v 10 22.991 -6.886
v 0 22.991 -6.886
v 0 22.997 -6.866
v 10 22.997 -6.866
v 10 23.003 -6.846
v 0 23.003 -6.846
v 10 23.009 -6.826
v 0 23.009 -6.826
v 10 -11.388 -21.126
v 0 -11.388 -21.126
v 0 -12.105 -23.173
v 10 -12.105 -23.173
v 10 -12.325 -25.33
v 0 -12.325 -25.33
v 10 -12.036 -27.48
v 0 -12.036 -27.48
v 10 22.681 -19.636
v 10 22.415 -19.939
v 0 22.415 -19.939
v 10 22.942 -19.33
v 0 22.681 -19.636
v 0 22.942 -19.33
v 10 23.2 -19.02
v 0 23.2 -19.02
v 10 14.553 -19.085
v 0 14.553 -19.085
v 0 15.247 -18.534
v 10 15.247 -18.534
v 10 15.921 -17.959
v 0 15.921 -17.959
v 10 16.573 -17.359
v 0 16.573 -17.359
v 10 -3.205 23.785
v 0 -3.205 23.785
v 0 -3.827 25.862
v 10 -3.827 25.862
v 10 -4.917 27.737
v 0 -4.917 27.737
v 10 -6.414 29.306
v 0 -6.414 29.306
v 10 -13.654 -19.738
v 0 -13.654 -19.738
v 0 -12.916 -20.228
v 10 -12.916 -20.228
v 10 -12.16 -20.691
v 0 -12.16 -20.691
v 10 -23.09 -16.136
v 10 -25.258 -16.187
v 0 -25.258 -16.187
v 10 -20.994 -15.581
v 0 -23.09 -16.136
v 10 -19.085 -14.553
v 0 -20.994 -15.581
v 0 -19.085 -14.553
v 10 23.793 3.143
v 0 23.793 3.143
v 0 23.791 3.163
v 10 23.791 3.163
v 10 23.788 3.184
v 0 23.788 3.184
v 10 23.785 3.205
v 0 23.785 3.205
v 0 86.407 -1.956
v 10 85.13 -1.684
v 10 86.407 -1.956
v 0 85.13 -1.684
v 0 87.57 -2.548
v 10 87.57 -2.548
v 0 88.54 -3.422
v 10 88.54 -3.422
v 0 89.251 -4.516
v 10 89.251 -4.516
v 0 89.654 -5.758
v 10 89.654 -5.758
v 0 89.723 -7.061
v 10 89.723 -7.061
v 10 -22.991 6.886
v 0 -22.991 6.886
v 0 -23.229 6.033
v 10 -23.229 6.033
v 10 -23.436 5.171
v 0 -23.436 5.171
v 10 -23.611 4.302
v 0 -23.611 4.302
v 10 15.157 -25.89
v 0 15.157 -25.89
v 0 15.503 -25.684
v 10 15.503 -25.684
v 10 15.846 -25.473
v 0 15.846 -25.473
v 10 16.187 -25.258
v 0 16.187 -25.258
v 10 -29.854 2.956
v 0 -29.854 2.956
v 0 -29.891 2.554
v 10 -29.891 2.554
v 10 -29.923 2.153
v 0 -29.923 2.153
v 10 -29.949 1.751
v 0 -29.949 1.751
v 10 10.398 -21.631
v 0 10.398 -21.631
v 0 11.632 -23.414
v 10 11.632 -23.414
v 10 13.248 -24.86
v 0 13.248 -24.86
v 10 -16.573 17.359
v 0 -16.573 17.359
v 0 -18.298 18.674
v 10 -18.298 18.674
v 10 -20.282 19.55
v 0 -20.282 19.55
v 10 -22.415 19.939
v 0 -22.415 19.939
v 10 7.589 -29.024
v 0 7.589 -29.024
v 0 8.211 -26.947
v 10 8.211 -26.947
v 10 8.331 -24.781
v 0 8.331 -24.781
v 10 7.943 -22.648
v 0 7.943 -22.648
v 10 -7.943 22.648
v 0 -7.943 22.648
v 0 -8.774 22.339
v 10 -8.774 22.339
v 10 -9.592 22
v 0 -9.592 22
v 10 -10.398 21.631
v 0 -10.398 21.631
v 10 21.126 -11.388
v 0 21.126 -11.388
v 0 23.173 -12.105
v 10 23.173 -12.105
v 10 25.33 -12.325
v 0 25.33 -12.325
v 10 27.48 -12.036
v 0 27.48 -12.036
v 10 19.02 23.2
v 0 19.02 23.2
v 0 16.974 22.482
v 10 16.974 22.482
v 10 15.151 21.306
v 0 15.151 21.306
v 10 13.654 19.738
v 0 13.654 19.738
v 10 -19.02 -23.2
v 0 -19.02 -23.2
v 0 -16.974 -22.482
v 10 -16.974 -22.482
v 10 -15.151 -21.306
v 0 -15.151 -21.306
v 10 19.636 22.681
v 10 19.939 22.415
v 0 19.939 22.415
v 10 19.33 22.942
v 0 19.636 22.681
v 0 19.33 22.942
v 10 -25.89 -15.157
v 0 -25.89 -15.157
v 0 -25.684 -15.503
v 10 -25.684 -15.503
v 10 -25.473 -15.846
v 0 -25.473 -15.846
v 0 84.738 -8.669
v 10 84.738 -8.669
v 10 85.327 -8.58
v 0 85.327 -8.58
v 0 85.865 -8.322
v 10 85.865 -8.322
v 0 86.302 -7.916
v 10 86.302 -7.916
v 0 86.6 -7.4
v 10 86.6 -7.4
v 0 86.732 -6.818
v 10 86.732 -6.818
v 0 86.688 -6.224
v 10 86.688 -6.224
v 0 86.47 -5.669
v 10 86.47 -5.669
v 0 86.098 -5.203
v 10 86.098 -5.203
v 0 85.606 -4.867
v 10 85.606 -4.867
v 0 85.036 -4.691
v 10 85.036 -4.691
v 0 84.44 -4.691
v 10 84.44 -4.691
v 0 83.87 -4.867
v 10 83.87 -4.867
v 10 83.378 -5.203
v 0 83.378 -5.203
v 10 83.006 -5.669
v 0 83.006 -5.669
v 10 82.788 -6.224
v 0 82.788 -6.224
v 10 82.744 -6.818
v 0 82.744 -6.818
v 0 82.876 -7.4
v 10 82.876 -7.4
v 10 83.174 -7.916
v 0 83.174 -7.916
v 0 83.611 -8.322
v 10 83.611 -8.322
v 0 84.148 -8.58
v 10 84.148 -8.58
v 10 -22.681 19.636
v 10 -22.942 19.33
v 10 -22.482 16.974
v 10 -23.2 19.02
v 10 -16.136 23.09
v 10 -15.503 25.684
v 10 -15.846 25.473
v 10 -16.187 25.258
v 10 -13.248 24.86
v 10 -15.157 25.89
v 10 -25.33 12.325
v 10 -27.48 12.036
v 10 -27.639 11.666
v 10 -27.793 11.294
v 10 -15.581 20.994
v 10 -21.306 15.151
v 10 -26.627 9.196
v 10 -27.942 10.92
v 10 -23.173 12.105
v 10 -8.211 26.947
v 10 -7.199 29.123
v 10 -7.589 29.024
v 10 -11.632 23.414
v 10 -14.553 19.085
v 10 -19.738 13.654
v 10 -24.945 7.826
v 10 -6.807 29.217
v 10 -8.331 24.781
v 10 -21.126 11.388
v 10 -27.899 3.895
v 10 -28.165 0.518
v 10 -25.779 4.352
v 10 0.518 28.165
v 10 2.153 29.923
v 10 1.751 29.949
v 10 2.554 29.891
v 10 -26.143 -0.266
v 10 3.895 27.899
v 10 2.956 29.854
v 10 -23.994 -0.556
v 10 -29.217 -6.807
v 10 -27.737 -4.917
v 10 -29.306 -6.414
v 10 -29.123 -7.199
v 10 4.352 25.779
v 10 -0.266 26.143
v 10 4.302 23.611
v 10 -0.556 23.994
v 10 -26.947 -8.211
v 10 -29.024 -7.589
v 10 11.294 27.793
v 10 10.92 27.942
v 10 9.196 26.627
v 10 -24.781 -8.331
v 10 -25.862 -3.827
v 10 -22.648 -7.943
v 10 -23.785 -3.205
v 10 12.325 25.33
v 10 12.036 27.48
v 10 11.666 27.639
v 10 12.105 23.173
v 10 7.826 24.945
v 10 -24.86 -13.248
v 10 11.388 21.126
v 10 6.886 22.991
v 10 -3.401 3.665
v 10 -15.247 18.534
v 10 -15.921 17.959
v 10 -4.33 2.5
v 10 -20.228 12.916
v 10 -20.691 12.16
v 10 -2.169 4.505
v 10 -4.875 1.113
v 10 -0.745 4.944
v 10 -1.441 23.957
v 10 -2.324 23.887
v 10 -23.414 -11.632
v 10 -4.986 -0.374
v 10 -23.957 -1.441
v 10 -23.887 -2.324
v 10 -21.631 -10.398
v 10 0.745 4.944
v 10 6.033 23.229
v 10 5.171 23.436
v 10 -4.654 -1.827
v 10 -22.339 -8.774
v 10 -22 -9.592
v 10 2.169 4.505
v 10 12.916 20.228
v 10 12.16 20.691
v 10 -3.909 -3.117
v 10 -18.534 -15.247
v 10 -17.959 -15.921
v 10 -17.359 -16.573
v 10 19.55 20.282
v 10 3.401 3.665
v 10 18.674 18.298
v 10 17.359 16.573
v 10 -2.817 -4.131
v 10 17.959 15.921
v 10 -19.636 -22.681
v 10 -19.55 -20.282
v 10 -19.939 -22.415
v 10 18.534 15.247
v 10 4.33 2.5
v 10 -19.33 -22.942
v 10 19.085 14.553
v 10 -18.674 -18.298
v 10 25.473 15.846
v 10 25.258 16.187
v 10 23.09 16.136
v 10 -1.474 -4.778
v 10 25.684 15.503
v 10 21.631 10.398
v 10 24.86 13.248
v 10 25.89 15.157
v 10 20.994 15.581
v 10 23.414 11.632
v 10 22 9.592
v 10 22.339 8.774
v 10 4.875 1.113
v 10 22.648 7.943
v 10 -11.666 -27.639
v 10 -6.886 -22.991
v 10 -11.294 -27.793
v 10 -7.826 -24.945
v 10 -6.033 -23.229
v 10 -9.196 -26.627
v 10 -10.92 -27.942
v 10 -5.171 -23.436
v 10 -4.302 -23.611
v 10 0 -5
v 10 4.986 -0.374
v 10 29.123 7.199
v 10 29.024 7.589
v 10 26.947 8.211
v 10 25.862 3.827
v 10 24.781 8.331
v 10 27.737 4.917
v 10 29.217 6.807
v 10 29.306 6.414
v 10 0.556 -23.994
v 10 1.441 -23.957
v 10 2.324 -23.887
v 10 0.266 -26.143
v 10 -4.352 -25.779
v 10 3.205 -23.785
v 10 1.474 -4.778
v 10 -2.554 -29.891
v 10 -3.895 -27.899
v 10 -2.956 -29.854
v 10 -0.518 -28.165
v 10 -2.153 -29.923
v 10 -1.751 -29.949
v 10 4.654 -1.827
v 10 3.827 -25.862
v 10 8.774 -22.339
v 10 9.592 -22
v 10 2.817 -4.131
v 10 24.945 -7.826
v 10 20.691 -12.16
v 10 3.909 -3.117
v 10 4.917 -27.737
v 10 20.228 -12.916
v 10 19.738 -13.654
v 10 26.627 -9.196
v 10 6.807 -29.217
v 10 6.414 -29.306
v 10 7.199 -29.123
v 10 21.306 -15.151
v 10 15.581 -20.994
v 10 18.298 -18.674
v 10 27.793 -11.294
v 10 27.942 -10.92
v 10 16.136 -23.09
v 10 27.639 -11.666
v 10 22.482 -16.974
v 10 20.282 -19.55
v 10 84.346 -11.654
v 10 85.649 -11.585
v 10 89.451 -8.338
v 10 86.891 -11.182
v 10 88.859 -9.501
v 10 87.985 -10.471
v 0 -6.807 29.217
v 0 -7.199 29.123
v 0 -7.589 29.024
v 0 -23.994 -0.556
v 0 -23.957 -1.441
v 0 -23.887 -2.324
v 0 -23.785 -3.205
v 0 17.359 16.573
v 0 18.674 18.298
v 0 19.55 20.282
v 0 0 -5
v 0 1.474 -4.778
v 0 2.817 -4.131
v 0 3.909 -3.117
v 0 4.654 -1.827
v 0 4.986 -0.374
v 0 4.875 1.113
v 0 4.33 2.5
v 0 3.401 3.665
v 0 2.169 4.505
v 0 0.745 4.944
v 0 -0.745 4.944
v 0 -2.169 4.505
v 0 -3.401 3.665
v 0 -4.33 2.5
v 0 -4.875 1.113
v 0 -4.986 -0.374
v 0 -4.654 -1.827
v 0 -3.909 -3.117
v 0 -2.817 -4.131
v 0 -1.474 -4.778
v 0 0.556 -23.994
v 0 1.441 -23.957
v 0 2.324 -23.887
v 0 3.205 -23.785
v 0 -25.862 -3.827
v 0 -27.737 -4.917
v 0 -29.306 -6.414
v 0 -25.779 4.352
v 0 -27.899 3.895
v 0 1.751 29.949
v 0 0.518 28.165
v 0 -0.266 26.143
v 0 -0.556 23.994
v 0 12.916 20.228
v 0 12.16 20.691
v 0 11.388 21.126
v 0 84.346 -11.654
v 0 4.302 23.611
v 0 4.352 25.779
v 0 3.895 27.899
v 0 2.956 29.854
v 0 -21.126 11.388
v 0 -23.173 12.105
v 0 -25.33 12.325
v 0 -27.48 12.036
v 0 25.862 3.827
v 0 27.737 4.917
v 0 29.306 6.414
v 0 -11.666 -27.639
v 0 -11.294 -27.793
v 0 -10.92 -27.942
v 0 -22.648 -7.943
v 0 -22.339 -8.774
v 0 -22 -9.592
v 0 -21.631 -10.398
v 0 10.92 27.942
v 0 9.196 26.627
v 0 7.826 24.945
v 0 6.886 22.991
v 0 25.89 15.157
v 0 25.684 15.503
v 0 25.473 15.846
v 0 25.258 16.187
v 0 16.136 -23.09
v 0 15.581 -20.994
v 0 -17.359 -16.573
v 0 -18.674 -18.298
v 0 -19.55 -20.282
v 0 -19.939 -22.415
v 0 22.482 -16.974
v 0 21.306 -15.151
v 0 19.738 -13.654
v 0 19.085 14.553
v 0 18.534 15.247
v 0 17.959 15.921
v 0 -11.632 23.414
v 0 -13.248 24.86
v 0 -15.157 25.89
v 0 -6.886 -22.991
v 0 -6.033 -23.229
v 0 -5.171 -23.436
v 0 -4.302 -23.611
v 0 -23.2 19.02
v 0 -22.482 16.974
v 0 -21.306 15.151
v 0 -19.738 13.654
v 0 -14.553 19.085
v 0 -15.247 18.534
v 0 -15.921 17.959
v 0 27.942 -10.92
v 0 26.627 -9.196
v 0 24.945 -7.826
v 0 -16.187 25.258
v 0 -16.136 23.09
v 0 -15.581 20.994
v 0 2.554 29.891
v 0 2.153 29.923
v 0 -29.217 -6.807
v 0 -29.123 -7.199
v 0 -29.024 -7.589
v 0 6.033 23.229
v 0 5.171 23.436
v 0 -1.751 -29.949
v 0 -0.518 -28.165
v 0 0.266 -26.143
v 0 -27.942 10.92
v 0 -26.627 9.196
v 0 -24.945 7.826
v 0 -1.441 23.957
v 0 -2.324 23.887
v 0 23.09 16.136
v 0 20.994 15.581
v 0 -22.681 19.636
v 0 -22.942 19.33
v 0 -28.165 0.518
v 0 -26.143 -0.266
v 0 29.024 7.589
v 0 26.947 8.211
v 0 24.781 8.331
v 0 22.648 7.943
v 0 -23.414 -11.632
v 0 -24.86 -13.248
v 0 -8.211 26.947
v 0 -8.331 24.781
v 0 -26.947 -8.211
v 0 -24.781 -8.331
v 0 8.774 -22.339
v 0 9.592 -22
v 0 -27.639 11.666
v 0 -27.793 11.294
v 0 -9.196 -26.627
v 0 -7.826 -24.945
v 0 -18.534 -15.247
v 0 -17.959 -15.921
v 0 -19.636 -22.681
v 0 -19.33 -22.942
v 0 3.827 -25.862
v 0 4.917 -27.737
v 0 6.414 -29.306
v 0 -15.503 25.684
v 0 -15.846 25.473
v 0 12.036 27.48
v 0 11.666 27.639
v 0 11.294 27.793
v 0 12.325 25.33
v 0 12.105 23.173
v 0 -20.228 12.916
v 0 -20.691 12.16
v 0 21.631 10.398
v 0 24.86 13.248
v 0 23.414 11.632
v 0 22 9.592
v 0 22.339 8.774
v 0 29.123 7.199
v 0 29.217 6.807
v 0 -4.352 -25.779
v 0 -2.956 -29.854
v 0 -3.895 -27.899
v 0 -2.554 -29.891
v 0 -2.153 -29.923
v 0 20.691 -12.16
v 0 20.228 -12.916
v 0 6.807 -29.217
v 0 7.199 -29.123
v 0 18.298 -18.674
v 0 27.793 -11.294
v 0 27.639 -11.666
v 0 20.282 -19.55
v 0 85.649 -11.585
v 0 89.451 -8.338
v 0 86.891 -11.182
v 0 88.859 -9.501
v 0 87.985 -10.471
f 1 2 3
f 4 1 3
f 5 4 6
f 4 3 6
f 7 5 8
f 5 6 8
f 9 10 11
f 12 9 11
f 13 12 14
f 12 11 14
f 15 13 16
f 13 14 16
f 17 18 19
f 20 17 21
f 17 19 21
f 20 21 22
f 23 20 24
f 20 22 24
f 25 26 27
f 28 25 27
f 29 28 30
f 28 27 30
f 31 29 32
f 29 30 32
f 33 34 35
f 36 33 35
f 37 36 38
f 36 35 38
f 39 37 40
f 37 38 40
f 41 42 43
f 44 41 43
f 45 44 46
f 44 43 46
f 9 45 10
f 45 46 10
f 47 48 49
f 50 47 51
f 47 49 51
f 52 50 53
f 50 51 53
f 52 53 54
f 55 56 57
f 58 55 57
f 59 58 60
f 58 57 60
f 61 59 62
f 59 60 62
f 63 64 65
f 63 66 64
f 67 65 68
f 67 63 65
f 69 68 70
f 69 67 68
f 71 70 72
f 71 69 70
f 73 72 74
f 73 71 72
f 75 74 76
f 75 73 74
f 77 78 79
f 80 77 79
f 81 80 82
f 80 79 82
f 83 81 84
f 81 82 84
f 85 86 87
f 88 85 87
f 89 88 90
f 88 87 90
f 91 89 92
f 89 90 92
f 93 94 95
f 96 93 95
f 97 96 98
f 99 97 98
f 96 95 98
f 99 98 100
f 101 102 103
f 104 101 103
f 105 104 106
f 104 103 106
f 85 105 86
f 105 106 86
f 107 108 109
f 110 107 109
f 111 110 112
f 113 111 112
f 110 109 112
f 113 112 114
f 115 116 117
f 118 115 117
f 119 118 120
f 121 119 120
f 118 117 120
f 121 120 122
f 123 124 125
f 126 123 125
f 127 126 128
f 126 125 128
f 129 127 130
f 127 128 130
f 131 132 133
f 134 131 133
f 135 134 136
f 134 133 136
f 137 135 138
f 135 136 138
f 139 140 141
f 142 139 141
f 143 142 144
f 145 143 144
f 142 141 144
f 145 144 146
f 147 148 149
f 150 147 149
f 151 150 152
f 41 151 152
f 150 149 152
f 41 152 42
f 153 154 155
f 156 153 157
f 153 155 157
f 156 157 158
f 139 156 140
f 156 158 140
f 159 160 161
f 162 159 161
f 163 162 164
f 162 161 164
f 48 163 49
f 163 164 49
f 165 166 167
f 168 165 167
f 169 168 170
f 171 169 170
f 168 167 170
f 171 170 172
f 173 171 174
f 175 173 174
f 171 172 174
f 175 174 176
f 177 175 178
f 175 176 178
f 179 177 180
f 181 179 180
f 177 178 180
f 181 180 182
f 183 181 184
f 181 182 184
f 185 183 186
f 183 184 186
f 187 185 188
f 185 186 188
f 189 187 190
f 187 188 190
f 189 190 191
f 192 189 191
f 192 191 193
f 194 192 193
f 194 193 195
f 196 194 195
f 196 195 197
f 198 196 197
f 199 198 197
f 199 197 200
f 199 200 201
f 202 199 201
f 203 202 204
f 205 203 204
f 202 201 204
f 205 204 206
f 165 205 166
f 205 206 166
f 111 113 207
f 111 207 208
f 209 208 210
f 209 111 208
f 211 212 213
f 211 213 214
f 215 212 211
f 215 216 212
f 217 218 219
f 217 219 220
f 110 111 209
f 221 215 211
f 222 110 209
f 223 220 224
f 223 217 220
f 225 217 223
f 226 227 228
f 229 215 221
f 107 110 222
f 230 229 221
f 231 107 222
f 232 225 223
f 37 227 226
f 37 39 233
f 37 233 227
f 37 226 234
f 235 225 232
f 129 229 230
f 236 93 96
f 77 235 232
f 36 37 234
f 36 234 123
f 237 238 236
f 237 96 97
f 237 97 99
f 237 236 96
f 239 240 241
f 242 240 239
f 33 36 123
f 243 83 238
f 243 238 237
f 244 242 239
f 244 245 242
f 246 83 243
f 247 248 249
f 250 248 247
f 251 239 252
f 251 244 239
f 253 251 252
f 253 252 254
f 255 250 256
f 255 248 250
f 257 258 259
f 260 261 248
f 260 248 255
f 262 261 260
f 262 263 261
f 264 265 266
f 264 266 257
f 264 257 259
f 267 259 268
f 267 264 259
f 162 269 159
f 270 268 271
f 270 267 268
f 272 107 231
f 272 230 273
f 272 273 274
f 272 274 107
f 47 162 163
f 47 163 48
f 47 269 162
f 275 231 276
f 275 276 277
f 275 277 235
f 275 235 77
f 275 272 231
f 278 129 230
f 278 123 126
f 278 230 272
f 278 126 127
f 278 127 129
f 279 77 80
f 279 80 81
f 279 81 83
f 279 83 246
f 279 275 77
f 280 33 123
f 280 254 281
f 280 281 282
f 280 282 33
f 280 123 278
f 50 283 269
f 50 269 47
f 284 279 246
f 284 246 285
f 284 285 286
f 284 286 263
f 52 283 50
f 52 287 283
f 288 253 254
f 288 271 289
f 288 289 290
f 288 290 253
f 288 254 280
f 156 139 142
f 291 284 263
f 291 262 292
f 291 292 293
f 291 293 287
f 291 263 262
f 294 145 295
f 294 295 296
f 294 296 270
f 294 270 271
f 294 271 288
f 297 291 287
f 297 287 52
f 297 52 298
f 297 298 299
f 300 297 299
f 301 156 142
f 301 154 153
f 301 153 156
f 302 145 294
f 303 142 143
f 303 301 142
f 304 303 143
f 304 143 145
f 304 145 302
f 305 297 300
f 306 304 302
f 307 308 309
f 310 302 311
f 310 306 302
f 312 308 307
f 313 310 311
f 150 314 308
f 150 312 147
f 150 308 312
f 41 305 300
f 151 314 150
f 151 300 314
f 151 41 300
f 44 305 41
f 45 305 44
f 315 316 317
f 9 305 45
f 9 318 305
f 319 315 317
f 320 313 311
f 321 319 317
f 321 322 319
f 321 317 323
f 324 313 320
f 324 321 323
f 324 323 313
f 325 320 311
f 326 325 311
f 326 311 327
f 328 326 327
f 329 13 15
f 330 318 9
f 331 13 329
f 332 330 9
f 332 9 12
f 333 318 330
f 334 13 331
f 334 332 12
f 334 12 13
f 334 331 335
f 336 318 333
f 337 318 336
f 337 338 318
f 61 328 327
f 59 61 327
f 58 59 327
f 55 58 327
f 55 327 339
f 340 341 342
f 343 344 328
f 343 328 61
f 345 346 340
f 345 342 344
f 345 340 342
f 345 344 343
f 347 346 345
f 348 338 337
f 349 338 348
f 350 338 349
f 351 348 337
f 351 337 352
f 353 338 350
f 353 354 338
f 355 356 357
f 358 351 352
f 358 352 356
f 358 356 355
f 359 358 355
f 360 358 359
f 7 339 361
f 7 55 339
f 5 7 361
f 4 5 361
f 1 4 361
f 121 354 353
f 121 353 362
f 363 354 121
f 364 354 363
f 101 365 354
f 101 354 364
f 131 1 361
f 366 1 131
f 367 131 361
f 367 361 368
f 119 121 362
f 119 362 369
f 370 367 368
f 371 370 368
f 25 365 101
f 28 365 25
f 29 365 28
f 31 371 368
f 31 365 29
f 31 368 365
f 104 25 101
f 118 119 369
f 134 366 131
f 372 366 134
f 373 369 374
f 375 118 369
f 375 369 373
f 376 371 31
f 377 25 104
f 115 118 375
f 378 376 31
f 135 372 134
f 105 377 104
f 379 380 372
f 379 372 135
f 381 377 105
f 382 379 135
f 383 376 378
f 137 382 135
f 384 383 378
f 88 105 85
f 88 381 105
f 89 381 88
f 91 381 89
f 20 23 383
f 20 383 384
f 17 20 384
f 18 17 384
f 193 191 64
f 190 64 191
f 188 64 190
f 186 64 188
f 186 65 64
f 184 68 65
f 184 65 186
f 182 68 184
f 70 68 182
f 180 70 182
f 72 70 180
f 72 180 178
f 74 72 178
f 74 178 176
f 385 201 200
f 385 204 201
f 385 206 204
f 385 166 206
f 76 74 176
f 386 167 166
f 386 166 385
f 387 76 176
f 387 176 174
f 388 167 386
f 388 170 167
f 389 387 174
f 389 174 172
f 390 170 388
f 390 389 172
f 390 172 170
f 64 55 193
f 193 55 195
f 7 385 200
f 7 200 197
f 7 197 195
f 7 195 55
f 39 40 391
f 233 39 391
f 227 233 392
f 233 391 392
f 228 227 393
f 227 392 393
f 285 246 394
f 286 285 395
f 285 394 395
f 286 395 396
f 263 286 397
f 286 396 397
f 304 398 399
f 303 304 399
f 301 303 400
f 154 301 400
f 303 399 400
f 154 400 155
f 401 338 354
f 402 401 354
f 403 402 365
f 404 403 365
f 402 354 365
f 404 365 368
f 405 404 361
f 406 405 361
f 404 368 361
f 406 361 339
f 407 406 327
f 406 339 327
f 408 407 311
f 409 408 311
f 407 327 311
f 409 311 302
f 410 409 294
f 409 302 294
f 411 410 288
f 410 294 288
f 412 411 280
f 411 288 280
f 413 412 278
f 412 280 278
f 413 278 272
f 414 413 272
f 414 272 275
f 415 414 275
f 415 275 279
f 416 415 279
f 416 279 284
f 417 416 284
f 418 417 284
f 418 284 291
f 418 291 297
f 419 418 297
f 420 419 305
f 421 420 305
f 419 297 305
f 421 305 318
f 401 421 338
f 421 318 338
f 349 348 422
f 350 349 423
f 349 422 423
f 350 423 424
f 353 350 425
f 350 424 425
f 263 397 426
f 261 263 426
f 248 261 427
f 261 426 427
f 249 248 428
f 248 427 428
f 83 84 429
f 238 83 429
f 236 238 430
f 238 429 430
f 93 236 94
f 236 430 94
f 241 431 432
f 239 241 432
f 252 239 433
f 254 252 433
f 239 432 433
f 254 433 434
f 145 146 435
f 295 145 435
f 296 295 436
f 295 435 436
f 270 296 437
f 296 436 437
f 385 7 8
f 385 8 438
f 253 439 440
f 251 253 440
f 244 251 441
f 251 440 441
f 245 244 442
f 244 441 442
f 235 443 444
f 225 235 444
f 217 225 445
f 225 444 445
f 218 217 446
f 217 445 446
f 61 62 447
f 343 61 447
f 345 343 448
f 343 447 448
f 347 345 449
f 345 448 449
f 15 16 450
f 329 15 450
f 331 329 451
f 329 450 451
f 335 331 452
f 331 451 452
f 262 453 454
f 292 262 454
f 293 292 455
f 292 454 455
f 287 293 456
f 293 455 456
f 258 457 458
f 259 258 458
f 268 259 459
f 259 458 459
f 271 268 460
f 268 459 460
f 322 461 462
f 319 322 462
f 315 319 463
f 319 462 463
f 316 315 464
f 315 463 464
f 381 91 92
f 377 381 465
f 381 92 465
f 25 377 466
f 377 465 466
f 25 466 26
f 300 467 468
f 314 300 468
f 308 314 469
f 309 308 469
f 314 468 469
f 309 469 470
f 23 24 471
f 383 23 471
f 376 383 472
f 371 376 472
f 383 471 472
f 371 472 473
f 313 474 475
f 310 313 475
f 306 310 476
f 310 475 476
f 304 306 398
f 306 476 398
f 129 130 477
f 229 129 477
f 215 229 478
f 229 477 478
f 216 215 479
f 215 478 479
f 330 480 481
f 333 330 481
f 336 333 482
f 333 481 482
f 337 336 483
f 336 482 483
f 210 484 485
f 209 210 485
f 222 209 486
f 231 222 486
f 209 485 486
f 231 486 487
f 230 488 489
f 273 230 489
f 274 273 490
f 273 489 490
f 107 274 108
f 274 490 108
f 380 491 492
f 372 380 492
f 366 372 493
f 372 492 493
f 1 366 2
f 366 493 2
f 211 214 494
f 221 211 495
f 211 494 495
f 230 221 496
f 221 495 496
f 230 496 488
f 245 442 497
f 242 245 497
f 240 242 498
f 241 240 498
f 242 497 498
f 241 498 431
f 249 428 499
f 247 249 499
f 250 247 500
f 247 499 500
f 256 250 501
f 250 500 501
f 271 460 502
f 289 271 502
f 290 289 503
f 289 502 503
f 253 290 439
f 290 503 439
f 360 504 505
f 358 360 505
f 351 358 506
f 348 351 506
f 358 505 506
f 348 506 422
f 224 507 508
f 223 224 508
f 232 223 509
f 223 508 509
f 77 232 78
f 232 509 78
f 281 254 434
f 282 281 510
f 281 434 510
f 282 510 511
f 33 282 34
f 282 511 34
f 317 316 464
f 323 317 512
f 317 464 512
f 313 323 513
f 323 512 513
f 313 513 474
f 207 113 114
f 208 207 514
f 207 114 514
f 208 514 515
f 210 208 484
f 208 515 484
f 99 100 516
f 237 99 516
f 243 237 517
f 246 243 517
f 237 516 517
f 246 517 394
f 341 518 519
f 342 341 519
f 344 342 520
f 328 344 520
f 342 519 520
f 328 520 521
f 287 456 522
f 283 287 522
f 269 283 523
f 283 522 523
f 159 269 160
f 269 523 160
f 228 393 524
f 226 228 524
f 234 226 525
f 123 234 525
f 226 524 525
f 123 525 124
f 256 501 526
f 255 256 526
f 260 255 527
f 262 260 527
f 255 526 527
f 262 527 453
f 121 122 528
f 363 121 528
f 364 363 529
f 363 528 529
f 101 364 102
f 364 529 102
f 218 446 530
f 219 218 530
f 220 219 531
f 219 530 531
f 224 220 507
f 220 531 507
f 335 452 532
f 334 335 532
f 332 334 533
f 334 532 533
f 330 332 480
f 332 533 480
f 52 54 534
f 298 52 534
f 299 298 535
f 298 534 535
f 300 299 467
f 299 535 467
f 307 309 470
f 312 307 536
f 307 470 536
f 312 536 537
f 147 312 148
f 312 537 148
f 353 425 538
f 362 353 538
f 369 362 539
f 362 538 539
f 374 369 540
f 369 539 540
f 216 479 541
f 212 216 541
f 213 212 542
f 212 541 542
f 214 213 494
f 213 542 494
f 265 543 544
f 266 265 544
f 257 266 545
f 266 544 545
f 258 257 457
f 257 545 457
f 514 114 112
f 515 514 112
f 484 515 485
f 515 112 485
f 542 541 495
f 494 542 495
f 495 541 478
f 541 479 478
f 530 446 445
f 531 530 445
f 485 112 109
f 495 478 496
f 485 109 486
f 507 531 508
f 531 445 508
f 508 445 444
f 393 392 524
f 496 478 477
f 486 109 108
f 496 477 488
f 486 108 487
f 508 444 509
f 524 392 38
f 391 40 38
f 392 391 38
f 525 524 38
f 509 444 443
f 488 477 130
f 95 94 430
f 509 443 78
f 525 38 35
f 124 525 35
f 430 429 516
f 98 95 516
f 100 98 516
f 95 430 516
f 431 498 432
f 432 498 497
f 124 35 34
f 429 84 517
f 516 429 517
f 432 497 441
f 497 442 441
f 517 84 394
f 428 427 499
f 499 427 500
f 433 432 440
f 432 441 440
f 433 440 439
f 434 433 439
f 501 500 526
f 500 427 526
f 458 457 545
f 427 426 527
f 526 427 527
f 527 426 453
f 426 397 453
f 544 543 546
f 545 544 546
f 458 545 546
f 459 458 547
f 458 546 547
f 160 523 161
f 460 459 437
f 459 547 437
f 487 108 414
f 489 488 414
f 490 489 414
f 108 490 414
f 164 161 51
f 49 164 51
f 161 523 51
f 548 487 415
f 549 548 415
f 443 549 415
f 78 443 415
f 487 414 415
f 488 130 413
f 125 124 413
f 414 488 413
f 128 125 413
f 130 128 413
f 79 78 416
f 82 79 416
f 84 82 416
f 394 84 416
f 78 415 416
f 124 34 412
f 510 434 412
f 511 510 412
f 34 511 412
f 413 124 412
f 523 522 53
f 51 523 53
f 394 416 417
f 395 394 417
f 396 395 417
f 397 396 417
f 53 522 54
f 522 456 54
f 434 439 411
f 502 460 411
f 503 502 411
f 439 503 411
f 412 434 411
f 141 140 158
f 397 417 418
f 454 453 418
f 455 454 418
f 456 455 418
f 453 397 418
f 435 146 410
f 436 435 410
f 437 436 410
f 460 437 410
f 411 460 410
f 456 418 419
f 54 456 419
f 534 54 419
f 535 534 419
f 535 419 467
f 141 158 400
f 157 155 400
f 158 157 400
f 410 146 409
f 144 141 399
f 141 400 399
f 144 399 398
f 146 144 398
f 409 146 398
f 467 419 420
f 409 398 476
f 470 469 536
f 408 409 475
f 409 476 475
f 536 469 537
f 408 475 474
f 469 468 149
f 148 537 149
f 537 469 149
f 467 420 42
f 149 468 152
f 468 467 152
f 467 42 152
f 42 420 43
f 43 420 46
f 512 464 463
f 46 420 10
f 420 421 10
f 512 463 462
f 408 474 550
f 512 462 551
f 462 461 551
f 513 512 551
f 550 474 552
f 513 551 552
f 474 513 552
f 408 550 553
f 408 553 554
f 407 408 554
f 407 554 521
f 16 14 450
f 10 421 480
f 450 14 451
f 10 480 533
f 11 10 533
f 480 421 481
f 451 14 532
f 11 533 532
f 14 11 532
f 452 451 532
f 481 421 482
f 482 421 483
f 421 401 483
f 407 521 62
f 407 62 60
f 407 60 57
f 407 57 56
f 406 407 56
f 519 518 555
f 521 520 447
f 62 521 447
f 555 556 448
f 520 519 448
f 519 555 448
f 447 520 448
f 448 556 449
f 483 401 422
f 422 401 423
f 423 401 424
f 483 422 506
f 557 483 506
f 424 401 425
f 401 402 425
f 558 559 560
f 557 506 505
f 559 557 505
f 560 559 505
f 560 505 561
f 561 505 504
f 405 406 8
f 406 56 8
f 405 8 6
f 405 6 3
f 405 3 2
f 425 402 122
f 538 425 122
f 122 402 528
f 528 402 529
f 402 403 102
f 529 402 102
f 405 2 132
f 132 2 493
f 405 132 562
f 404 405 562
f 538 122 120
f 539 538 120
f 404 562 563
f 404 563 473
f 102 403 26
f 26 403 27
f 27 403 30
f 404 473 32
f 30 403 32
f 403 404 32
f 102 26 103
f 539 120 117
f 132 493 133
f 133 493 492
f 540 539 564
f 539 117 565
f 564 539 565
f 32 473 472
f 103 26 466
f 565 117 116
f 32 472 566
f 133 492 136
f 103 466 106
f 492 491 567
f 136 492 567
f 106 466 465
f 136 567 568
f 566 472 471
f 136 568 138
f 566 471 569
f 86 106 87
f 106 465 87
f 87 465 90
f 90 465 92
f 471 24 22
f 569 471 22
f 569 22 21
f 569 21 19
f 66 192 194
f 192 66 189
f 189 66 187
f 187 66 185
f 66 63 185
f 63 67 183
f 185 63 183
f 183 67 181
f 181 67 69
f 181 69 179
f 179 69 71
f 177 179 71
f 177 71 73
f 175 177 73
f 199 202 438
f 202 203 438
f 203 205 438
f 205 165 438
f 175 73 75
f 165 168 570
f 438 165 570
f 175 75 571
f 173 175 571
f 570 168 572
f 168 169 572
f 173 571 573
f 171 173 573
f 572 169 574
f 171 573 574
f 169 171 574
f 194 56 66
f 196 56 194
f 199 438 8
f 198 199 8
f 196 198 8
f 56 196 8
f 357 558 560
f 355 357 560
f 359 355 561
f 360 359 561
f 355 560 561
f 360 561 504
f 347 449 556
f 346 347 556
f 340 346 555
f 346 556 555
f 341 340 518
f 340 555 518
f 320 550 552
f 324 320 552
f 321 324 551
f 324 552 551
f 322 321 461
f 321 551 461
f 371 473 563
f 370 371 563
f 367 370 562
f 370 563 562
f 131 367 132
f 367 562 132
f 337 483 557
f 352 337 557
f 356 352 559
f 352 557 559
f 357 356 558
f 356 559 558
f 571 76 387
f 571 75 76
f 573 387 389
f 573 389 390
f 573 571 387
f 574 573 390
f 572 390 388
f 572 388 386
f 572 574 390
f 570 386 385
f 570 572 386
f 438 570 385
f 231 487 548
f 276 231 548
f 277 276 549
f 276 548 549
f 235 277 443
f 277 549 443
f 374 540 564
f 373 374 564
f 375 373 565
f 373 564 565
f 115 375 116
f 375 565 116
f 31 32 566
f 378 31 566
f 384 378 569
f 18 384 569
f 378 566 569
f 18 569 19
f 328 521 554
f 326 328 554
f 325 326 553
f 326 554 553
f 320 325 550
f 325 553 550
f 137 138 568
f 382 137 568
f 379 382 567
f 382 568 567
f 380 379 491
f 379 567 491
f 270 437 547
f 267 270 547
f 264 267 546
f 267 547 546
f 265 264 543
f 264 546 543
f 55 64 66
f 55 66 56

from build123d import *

# Parameters (mm, degrees)
EXTRUDE_1_DEPTH     = 10
EXTRUDE_2_DEPTH     = 10
FILLET_1_R          = 5
SKETCH_3_R          = 5
CUT_EXTRUDE_1_DEPTH = 10
SKETCH_4_R          = 2
CUT_EXTRUDE_2_DEPTH = 10


with BuildPart() as part:
    # 草图1 → 凸台-拉伸1 (new body)
    with BuildSketch(Plane(origin=(0, 0, 0), x_dir=(0, 0, -1), z_dir=(1, 0, 0))):
        with BuildLine():
            ThreePointArc((-7.942884534, 22.647529341), (-9.184402377, 22.17310878), (-10.397754058, 21.630689091))
            ThreePointArc((-10.397754058, 21.630689091), (-12.397305949, 24.184674774), (-15.156649968, 25.889688329))
            ThreePointArc((-15.156649968, 25.889688329), (-15.674956941, 25.579204931), (-16.186906117, 25.258346549))
            ThreePointArc((-16.186906117, 25.258346549), (-15.920443886, 22.02569307), (-14.552603542, 19.084594053))
            ThreePointArc((-14.552603542, 19.084594053), (-15.58675316, 18.249743174), (-16.573102281, 17.358925105))
            ThreePointArc((-16.573102281, 17.358925105), (-19.264014116, 19.170014316), (-22.41518439, 19.938894372))
            ThreePointArc((-22.41518439, 19.938894372), (-22.812178968, 19.48344145), (-23.199920874, 19.020085999))
            ThreePointArc((-23.199920874, 19.020085999), (-21.947555371, 16.027991201), (-19.737812321, 13.653525728))
            ThreePointArc((-19.737812321, 13.653525728), (-20.463363944, 12.539965553), (-21.126159781, 11.387948582))
            ThreePointArc((-21.126159781, 11.387948582), (-24.245026361, 12.278859291), (-27.479564388, 12.036342512))
            ThreePointArc((-27.479564388, 12.036342512), (-27.716385975, 11.480502971), (-27.941965733, 10.920006912))
            ThreePointArc((-27.941965733, 10.920006912), (-25.82628722, 8.46135788), (-22.990946508, 6.885955175))
            ThreePointArc((-22.990946508, 6.885955175), (-23.33687809, 5.602688733), (-23.611241567, 4.302240308))
            ThreePointArc((-23.611241567, 4.302240308), (-26.852766501, 4.185763967), (-29.854053162, 2.955589584))
            ThreePointArc((-29.854053162, 2.955589584), (-29.907520012, 2.353772872), (-29.948856303, 1.751001464))
            ThreePointArc((-29.948856303, 1.751001464), (-27.176962132, 0.066467896), (-23.993566664, -0.555660648))
            ThreePointArc((-23.993566664, -0.555660648), (-23.92601601, -1.883018297), (-23.785090519, -3.204601222))
            ThreePointArc((-23.785090519, -3.204601222), (-26.831970761, -4.317063099), (-29.306219208, -6.414477044))
            ThreePointArc((-29.306219208, -6.414477044), (-29.171097612, -7.003360916), (-29.024144152, -7.589404208))
            ThreePointArc((-29.024144152, -7.589404208), (-25.867366639, -8.334928429), (-22.647529341, -7.942884534))
            ThreePointArc((-22.647529341, -7.942884534), (-22.17310878, -9.184402377), (-21.630689091, -10.397754058))
            ThreePointArc((-21.630689091, -10.397754058), (-24.184674774, -12.397305949), (-25.889688329, -15.156649968))
            ThreePointArc((-25.889688329, -15.156649968), (-25.579204931, -15.674956941), (-25.258346549, -16.186906117))
            ThreePointArc((-25.258346549, -16.186906117), (-22.02569307, -15.920443886), (-19.084594053, -14.552603542))
            ThreePointArc((-19.084594053, -14.552603542), (-18.249743174, -15.58675316), (-17.358925105, -16.573102281))
            ThreePointArc((-17.358925105, -16.573102281), (-19.170014316, -19.264014116), (-19.938894372, -22.41518439))
            ThreePointArc((-19.938894372, -22.41518439), (-19.48344145, -22.812178968), (-19.020085999, -23.199920874))
            ThreePointArc((-19.020085999, -23.199920874), (-16.027991201, -21.947555371), (-13.653525728, -19.737812321))
            ThreePointArc((-13.653525728, -19.737812321), (-12.539965553, -20.463363944), (-11.387948582, -21.126159781))
            ThreePointArc((-11.387948582, -21.126159781), (-12.278859291, -24.245026361), (-12.036342512, -27.479564388))
            ThreePointArc((-12.036342512, -27.479564388), (-11.480502971, -27.716385975), (-10.920006912, -27.941965733))
            ThreePointArc((-10.920006912, -27.941965733), (-8.46135788, -25.82628722), (-6.885955175, -22.990946508))
            ThreePointArc((-6.885955175, -22.990946508), (-5.602688733, -23.33687809), (-4.302240308, -23.611241567))
            ThreePointArc((-4.302240308, -23.611241567), (-4.185763967, -26.852766501), (-2.955589584, -29.854053162))
            ThreePointArc((-2.955589584, -29.854053162), (-2.353772872, -29.907520012), (-1.751001464, -29.948856303))
            ThreePointArc((-1.751001464, -29.948856303), (-0.066467896, -27.176962132), (0.555660648, -23.993566664))
            ThreePointArc((0.555660648, -23.993566664), (1.883018297, -23.92601601), (3.204601222, -23.785090519))
            ThreePointArc((3.204601222, -23.785090519), (4.317063099, -26.831970761), (6.414477044, -29.306219208))
            ThreePointArc((6.414477044, -29.306219208), (7.003360916, -29.171097612), (7.589404208, -29.024144152))
            ThreePointArc((7.589404208, -29.024144152), (8.334928429, -25.867366639), (7.942884534, -22.647529341))
            ThreePointArc((7.942884534, -22.647529341), (9.184402377, -22.17310878), (10.397754058, -21.630689091))
            ThreePointArc((10.397754058, -21.630689091), (12.397305949, -24.184674774), (15.156649968, -25.889688329))
            ThreePointArc((15.156649968, -25.889688329), (15.674956941, -25.579204931), (16.186906117, -25.258346549))
            ThreePointArc((16.186906117, -25.258346549), (15.920443886, -22.02569307), (14.552603542, -19.084594053))
            ThreePointArc((14.552603542, -19.084594053), (15.58675316, -18.249743174), (16.573102281, -17.358925105))
            ThreePointArc((16.573102281, -17.358925105), (19.264014116, -19.170014316), (22.41518439, -19.938894372))
            ThreePointArc((22.41518439, -19.938894372), (22.812178968, -19.48344145), (23.199920874, -19.020085999))
            ThreePointArc((23.199920874, -19.020085999), (21.947555371, -16.027991201), (19.737812321, -13.653525728))
            ThreePointArc((19.737812321, -13.653525728), (20.463363944, -12.539965553), (21.126159781, -11.387948582))
            ThreePointArc((21.126159781, -11.387948582), (24.245026361, -12.278859291), (27.479564388, -12.036342512))
            ThreePointArc((27.479564388, -12.036342512), (27.716385975, -11.480502971), (27.941965733, -10.920006912))
            ThreePointArc((27.941965733, -10.920006912), (25.82628722, -8.46135788), (22.990946508, -6.885955175))
            ThreePointArc((22.990946508, -6.885955175), (23.33687809, -5.602688733), (23.611241567, -4.302240308))
            ThreePointArc((23.611241567, -4.302240308), (26.852766501, -4.185763967), (29.854053162, -2.955589584))
            ThreePointArc((29.854053162, -2.955589584), (29.907520012, -2.353772872), (29.948856303, -1.751001464))
            ThreePointArc((29.948856303, -1.751001464), (27.176962132, -0.066467896), (23.993566664, 0.555660648))
            ThreePointArc((23.993566664, 0.555660648), (23.92601601, 1.883018297), (23.785090519, 3.204601222))
            ThreePointArc((23.785090519, 3.204601222), (26.831970761, 4.317063099), (29.306219208, 6.414477044))
            ThreePointArc((29.306219208, 6.414477044), (29.171097612, 7.003360916), (29.024144152, 7.589404208))
            ThreePointArc((29.024144152, 7.589404208), (25.867366639, 8.334928429), (22.647529341, 7.942884534))
            ThreePointArc((22.647529341, 7.942884534), (22.17310878, 9.184402377), (21.630689091, 10.397754058))
            ThreePointArc((21.630689091, 10.397754058), (24.184674774, 12.397305949), (25.889688329, 15.156649968))
            ThreePointArc((25.889688329, 15.156649968), (25.579204931, 15.674956941), (25.258346549, 16.186906117))
            ThreePointArc((25.258346549, 16.186906117), (22.02569307, 15.920443886), (19.084594053, 14.552603542))
            ThreePointArc((19.084594053, 14.552603542), (18.249743174, 15.58675316), (17.358925105, 16.573102281))
            ThreePointArc((17.358925105, 16.573102281), (19.170014316, 19.264014116), (19.938894372, 22.41518439))
            ThreePointArc((19.938894372, 22.41518439), (19.48344145, 22.812178968), (19.020085999, 23.199920874))
            ThreePointArc((19.020085999, 23.199920874), (16.027991201, 21.947555371), (13.653525728, 19.737812321))
            ThreePointArc((13.653525728, 19.737812321), (12.539965553, 20.463363944), (11.387948582, 21.126159781))
            ThreePointArc((11.387948582, 21.126159781), (12.278859291, 24.245026361), (12.036342512, 27.479564388))
            ThreePointArc((12.036342512, 27.479564388), (11.480502971, 27.716385975), (10.920006912, 27.941965733))
            ThreePointArc((10.920006912, 27.941965733), (8.46135788, 25.82628722), (6.885955175, 22.990946508))
            ThreePointArc((6.885955175, 22.990946508), (5.602688733, 23.33687809), (4.302240308, 23.611241567))
            ThreePointArc((4.302240308, 23.611241567), (4.185763967, 26.852766501), (2.955589584, 29.854053162))
            ThreePointArc((2.955589584, 29.854053162), (2.353772872, 29.907520012), (1.751001464, 29.948856303))
            ThreePointArc((1.751001464, 29.948856303), (0.066467896, 27.176962132), (-0.555660648, 23.993566664))
            ThreePointArc((-0.555660648, 23.993566664), (-1.883018297, 23.92601601), (-3.204601222, 23.785090519))
            ThreePointArc((-3.204601222, 23.785090519), (-4.317063099, 26.831970761), (-6.414477044, 29.306219208))
            ThreePointArc((-6.414477044, 29.306219208), (-7.003360916, 29.171097612), (-7.589404208, 29.024144152))
            ThreePointArc((-7.589404208, 29.024144152), (-8.334928429, 25.867366639), (-7.942884534, 22.647529341))
        make_face()
    extrude(amount=EXTRUDE_1_DEPTH)

    # 草图2 → 凸台-拉伸2 (add)
    with BuildSketch(Plane(origin=(10, 0, 0), x_dir=(0, 0, -1), z_dir=(1, 0, 0))):
        Polygon((2.076731947, 90.114855515), (-4.984586669, 0.392295479), (4.984586669, -0.392295479), (12.045905284, 89.330264557), align=None)
    extrude(amount=-EXTRUDE_2_DEPTH)

    # 圆角1
    fillet_1_edges = [part.edges().sort_by_distance(p)[0] for p in [
        (5, 89.330264557, -12.045905284),
        (5, 90.114855515, -2.076731947),
    ]]
    fillet(fillet_1_edges, radius=FILLET_1_R - 0.0001)  # a hair under: the kernel refuses the full size

    # 草图3 → 切除-拉伸1 (cut)
    with BuildSketch(Plane(origin=(10, 0, 0), x_dir=(0, 0, -1), z_dir=(1, 0, 0))):
        Circle(SKETCH_3_R)
    extrude(amount=-CUT_EXTRUDE_1_DEPTH, mode=Mode.SUBTRACT)

    # 草图4 → 切除-拉伸2 (cut)
    with BuildSketch(Plane(origin=(10, 0, 0), x_dir=(0, 0, -1), z_dir=(1, 0, 0))):
        with Locations((6.669023137, 84.737973367)):
            Circle(SKETCH_4_R)
    extrude(amount=-CUT_EXTRUDE_2_DEPTH, mode=Mode.SUBTRACT)


solid = part.part
